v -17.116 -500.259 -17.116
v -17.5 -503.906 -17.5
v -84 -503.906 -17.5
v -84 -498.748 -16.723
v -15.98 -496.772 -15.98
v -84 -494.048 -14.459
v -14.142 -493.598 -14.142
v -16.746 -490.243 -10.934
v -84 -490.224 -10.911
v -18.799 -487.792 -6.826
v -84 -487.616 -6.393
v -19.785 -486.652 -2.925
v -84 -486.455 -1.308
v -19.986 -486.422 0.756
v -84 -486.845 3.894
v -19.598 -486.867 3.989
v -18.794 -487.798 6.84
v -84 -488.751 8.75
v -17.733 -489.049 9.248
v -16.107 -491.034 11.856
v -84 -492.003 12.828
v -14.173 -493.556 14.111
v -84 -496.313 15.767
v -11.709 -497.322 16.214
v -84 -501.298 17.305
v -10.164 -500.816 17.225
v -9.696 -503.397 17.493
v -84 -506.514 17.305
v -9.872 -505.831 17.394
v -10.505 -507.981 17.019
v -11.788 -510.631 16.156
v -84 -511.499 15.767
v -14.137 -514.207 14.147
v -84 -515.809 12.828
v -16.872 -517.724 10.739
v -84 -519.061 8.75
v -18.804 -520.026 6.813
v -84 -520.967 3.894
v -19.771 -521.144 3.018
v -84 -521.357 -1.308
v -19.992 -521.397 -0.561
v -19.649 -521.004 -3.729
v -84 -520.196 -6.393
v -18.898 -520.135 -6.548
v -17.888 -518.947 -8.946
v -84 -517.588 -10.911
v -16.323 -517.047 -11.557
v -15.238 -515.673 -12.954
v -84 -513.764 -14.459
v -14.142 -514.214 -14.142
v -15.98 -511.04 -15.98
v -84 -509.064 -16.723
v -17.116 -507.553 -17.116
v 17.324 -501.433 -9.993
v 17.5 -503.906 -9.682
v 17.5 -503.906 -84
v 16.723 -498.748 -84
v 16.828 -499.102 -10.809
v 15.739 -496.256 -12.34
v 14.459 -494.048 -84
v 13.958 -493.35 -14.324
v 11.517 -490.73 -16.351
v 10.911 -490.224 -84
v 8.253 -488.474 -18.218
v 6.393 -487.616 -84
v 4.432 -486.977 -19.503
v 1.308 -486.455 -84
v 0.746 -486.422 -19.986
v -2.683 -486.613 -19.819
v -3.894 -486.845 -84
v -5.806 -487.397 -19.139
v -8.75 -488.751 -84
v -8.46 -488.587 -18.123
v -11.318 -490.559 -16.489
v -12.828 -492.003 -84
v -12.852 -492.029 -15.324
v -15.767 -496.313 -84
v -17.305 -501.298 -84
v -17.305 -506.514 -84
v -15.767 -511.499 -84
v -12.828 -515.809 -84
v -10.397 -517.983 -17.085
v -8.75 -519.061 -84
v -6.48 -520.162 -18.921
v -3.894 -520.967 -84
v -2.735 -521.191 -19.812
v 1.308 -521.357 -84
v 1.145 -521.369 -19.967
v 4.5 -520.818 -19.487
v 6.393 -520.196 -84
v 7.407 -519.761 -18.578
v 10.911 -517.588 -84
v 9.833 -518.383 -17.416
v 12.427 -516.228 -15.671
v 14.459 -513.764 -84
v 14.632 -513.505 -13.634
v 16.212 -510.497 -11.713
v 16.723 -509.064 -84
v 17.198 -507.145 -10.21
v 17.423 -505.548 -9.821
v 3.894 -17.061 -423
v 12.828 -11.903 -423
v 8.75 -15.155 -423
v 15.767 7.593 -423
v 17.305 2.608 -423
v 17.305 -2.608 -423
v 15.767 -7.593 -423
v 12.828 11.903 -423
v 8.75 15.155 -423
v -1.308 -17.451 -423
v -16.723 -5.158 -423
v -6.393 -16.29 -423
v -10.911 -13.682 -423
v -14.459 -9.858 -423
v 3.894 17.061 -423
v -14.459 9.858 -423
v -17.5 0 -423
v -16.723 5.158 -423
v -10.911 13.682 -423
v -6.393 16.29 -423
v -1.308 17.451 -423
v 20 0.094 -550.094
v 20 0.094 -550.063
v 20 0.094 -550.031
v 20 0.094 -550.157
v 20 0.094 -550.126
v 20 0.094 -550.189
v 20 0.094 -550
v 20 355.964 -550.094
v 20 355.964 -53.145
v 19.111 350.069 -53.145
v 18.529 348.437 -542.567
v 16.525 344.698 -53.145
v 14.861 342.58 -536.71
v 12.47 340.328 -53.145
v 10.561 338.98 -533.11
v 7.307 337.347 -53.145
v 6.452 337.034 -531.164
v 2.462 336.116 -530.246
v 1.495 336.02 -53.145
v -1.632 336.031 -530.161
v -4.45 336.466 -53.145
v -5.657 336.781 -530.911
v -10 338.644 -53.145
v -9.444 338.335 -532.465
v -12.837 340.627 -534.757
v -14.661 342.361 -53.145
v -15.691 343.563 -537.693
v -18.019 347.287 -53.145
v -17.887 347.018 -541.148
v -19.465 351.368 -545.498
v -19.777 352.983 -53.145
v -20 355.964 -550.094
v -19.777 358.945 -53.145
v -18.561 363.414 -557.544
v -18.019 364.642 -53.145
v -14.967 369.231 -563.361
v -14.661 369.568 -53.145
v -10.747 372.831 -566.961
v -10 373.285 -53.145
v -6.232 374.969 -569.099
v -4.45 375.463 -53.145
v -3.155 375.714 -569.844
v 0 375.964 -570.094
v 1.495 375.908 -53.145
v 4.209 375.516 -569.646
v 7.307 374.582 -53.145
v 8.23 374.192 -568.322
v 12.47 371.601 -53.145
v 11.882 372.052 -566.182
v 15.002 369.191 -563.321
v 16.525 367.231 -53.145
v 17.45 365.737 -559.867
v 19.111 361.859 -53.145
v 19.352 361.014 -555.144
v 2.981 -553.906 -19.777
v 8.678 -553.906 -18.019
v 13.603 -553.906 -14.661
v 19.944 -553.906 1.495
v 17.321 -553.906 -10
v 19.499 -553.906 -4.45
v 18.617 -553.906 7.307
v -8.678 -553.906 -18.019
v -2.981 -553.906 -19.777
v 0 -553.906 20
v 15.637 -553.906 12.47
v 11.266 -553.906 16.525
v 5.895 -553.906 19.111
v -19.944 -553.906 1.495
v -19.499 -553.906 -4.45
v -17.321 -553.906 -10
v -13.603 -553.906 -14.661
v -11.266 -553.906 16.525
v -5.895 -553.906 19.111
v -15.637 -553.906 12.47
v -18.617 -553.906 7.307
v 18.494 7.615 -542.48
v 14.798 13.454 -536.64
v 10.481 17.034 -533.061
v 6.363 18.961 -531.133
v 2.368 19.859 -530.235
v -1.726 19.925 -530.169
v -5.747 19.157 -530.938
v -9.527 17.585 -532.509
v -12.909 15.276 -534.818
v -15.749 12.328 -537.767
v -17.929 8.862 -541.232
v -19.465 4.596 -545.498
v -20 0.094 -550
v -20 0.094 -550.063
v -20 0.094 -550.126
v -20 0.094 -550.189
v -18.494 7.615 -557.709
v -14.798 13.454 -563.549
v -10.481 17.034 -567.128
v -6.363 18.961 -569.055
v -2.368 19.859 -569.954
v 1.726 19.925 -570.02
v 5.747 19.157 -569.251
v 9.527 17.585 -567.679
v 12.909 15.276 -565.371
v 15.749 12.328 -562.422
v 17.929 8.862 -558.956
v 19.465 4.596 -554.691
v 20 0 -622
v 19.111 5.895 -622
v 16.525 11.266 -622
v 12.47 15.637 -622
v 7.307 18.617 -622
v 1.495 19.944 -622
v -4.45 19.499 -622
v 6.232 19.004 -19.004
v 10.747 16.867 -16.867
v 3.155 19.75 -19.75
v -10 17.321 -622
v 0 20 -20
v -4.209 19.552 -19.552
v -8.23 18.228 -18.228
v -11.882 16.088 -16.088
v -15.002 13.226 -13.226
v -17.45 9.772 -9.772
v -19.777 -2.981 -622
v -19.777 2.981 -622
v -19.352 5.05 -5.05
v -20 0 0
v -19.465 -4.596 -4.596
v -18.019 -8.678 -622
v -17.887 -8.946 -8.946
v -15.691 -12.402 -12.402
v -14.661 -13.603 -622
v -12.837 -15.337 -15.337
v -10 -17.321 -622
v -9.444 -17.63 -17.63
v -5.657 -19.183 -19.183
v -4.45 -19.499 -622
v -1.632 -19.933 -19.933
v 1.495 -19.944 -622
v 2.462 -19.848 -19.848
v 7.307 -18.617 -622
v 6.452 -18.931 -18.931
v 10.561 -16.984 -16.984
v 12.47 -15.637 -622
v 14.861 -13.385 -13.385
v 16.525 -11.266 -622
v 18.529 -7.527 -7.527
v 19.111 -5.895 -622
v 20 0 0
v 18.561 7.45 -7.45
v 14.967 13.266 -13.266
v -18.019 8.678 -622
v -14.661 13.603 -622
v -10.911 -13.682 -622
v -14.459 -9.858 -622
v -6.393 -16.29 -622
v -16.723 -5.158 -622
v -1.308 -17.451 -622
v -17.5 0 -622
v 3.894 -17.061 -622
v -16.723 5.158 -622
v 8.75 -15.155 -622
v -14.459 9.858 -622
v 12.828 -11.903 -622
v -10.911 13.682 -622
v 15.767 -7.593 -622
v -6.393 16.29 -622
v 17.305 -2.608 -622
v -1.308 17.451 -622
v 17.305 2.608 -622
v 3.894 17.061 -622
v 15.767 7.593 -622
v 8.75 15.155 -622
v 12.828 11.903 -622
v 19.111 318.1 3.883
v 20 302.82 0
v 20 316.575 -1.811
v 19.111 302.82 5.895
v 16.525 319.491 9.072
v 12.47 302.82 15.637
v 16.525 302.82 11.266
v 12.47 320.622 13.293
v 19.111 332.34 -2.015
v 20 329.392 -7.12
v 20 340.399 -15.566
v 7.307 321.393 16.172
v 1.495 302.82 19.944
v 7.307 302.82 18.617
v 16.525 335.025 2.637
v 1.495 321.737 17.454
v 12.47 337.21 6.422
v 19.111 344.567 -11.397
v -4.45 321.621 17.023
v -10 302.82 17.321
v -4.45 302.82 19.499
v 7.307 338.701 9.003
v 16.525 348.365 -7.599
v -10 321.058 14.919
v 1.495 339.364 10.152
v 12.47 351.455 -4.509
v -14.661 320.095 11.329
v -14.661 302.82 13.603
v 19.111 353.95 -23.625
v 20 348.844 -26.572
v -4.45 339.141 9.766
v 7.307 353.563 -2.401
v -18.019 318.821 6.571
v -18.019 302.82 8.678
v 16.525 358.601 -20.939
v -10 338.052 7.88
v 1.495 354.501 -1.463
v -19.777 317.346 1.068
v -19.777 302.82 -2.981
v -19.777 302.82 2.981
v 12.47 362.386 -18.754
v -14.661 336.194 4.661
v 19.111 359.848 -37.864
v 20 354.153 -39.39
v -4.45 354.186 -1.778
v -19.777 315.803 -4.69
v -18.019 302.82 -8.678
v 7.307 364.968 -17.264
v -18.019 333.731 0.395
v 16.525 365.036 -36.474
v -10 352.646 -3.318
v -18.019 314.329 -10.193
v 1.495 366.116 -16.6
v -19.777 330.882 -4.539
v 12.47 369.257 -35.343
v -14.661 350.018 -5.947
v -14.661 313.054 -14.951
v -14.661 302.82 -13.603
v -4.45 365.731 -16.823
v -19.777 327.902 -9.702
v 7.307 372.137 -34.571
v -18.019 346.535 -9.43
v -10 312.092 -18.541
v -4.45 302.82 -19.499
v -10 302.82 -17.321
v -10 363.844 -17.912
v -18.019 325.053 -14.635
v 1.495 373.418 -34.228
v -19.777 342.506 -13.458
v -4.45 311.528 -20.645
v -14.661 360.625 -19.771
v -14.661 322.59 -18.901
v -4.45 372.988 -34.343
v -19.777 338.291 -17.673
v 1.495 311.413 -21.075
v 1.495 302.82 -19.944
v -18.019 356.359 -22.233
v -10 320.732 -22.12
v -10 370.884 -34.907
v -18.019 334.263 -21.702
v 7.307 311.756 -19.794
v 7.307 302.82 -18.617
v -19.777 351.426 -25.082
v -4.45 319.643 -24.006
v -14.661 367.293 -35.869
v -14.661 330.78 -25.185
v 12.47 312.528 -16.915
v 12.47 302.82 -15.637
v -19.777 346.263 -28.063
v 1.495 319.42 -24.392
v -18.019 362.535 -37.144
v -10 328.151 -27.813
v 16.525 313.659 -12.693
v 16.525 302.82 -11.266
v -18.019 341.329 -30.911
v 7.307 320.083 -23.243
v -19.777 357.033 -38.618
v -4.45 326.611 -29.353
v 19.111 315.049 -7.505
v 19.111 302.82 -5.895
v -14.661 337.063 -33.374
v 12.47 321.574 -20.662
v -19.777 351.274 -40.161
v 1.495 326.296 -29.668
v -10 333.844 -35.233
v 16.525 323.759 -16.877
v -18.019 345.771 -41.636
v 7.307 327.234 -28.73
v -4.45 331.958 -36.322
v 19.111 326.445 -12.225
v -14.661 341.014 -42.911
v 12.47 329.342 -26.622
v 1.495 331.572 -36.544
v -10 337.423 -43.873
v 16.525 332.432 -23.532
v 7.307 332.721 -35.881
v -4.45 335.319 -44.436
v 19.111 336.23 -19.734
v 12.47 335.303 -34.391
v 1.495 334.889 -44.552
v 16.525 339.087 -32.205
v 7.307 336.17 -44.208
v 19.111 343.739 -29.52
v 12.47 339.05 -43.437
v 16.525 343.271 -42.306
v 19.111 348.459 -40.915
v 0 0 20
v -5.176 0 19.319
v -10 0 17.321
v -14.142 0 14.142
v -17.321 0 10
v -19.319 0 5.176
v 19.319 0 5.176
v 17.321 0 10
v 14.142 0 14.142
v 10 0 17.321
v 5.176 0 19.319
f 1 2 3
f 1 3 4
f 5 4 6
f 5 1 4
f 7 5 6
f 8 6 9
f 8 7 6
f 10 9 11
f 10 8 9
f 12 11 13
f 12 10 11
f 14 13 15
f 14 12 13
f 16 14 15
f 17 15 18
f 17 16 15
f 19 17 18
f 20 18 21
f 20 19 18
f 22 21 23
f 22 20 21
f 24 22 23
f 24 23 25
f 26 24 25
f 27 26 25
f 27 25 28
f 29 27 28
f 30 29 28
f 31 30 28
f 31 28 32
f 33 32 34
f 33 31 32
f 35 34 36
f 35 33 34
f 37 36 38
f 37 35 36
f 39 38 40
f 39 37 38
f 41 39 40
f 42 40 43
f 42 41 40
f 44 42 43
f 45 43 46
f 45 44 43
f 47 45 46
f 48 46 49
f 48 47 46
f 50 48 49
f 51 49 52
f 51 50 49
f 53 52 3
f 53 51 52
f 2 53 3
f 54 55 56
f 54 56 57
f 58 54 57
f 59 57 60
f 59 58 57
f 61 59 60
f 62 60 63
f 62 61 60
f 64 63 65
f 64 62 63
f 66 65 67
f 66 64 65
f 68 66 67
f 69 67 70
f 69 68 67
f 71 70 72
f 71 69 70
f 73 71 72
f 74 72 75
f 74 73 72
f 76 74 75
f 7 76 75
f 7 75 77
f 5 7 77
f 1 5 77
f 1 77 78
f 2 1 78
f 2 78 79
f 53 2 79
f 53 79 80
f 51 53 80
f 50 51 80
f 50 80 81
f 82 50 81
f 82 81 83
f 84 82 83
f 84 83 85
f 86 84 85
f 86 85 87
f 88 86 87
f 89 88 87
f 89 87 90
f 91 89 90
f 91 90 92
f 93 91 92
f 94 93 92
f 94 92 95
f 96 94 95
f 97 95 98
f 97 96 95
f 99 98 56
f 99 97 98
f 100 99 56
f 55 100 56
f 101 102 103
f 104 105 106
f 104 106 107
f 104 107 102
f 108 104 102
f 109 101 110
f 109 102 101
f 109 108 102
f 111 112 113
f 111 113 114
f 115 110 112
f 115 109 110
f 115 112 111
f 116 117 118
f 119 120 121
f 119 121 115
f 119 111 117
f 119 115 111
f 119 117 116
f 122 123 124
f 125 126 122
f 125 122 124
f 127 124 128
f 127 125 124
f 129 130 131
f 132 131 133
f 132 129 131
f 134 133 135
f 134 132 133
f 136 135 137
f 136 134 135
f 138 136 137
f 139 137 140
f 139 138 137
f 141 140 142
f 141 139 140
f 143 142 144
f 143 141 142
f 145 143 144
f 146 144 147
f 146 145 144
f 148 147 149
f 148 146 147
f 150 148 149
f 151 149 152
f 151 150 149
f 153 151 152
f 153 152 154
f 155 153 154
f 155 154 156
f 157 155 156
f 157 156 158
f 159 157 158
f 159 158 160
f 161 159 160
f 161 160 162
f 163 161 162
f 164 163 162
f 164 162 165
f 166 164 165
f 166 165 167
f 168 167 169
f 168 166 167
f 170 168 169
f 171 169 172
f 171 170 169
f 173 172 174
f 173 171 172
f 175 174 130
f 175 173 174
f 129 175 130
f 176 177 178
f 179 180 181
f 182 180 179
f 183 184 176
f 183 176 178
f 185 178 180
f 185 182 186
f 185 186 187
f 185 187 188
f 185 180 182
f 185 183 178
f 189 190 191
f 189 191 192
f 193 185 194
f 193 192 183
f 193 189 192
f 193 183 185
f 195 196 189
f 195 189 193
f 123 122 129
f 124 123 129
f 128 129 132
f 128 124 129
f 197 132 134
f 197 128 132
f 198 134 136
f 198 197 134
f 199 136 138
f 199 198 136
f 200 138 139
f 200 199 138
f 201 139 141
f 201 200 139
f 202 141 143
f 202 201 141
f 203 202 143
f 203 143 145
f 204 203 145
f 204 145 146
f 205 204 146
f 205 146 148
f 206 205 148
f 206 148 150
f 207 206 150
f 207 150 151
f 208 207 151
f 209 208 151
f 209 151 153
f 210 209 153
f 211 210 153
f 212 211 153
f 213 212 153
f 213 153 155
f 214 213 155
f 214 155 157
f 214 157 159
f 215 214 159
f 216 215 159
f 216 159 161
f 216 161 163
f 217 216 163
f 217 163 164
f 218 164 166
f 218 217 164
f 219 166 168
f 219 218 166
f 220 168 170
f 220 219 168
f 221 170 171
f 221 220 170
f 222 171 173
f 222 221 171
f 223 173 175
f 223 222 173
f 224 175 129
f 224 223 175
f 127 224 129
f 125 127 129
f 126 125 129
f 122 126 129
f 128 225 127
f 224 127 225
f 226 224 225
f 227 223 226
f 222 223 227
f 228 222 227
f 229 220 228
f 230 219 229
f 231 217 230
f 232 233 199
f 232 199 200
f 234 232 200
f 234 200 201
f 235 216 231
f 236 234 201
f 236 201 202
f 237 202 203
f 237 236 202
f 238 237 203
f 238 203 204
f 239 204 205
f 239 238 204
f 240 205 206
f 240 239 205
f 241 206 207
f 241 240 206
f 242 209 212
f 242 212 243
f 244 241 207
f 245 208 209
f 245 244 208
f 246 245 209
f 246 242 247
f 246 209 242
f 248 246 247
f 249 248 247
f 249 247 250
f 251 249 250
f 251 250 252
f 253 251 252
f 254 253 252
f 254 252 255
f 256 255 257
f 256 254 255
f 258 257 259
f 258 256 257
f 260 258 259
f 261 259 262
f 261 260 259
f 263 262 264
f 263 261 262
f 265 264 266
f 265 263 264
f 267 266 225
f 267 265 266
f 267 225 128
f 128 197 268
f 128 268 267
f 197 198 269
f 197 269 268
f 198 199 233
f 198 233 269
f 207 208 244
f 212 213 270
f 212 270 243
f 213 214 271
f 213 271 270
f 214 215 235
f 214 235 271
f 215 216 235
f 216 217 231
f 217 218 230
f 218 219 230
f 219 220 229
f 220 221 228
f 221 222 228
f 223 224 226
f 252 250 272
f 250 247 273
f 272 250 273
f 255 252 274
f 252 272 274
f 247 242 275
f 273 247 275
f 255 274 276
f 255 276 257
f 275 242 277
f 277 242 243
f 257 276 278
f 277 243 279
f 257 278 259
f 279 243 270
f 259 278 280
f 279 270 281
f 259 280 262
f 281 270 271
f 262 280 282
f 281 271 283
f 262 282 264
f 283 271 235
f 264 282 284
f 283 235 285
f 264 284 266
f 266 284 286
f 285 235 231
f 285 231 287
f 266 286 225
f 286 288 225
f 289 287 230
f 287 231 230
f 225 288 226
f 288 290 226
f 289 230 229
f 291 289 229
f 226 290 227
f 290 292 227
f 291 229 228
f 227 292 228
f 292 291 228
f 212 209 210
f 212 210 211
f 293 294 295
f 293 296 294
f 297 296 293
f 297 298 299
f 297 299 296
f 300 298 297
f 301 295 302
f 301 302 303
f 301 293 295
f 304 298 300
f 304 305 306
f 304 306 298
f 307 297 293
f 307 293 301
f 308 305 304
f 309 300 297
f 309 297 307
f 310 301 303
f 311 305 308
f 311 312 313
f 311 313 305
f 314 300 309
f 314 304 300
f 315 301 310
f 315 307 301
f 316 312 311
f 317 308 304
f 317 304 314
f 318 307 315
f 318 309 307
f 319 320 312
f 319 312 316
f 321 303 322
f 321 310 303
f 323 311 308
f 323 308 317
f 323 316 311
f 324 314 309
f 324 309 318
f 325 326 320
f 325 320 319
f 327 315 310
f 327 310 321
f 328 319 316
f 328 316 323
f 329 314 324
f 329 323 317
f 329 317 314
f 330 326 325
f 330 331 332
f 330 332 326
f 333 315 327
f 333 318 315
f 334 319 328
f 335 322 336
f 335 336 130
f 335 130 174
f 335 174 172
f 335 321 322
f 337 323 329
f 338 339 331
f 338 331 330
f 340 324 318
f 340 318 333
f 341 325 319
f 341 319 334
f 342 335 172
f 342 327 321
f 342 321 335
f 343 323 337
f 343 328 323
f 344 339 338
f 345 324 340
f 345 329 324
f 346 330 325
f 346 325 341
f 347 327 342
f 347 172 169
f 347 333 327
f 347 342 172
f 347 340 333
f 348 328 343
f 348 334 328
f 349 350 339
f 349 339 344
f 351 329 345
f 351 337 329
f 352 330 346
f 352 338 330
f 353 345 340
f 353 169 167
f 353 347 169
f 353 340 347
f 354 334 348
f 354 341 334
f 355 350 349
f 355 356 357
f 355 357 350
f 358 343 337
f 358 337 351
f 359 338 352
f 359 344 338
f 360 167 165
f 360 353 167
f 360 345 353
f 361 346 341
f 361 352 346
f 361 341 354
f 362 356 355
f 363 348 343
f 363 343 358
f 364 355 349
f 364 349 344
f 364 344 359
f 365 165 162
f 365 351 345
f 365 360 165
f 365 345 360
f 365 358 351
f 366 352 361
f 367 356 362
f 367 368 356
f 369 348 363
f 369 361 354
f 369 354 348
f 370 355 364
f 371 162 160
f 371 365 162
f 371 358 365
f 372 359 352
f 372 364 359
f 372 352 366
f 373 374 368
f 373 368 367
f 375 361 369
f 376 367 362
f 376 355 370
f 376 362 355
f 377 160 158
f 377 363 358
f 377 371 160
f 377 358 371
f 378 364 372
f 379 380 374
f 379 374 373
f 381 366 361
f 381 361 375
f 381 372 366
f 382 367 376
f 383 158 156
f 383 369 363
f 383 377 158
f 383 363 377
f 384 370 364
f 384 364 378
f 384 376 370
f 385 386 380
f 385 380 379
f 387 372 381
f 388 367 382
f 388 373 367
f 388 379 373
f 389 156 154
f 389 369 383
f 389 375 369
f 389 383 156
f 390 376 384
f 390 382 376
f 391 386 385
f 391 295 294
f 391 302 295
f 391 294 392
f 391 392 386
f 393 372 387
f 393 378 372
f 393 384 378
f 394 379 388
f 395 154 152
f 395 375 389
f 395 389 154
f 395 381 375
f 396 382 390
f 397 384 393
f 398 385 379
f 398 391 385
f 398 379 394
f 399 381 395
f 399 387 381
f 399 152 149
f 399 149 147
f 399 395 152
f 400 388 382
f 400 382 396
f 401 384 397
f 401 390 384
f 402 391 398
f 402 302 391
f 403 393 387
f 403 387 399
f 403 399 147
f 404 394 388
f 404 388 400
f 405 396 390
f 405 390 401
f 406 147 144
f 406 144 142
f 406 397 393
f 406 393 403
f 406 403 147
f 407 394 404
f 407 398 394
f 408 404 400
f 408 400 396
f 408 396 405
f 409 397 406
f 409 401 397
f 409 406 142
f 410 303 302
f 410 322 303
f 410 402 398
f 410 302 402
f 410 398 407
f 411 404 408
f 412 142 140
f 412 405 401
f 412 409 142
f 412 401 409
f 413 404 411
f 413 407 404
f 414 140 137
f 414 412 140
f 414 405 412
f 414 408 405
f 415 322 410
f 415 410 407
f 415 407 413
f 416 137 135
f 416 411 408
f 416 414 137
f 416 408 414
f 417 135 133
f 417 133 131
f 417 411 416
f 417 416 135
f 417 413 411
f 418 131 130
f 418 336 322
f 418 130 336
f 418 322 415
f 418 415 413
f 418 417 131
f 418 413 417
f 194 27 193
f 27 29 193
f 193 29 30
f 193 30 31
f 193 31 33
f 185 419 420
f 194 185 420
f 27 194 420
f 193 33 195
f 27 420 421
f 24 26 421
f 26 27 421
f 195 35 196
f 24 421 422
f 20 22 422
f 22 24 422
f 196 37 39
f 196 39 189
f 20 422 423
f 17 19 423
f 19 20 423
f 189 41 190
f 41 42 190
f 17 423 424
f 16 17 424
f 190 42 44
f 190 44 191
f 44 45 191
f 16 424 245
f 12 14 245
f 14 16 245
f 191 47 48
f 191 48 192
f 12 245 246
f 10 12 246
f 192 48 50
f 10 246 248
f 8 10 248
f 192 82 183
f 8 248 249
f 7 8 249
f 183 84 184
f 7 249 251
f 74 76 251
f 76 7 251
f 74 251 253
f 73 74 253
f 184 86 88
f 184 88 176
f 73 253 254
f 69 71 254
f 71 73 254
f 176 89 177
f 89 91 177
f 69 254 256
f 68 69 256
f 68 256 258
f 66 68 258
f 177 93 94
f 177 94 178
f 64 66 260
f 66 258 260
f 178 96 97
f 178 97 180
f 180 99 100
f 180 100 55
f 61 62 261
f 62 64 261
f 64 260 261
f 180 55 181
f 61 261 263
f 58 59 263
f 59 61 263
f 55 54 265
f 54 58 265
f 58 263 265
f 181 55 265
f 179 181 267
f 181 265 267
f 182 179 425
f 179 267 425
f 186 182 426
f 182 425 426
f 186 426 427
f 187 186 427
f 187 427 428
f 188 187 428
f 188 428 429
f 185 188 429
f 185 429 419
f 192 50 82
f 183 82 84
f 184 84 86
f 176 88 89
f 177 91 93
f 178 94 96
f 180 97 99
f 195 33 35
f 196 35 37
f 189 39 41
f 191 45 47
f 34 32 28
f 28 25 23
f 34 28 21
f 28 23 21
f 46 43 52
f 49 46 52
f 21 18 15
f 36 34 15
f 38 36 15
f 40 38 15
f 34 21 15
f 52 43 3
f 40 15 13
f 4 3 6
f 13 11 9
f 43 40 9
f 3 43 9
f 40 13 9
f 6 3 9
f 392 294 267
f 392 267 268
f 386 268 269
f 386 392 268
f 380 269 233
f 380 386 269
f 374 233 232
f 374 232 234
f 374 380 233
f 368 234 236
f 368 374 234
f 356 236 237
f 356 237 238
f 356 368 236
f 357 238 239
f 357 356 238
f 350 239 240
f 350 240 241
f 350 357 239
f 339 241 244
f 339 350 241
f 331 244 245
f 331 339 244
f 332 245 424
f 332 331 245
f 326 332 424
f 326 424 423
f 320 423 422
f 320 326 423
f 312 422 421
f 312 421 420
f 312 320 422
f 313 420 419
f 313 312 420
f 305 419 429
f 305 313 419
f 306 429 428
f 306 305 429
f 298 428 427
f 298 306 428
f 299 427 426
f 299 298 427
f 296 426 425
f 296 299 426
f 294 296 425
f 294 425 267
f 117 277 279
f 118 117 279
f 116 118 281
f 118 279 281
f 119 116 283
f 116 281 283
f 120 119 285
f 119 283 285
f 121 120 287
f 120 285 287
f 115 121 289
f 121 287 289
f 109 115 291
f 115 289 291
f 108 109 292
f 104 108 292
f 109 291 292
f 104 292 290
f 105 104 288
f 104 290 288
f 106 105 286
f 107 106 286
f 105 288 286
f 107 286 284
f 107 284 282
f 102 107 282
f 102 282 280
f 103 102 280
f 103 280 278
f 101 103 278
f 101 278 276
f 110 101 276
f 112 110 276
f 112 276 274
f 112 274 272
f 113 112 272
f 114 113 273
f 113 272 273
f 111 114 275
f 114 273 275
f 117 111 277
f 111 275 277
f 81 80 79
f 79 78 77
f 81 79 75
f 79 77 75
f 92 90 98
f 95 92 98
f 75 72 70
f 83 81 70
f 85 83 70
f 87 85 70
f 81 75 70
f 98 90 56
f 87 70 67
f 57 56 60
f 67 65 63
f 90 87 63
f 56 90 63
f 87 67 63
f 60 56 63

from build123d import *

# Parameters (mm, degrees)
SKETCH2_R           = 20
SKETCH4_R           = 20
BOSS_EXTRUDE1_DEPTH = 553.90605298
SKETCH5_R           = 20
BOSS_EXTRUDE2_DEPTH = 622
SKETCH6_R           = 17.5
CUT_EXTRUDE1_DEPTH  = 199
SKETCH7_R           = 17.5
BOSS_EXTRUDE3_DEPTH = 84
SKETCH9_R           = 17.5
BOSS_EXTRUDE4_DEPTH = 84


with BuildPart() as part:
    # Sweep1: sweep along a path in Sketch3
    with BuildLine(Plane(origin=(0, 0, 0), x_dir=(0, 0, -1), z_dir=(1, 0, 0))) as sweep1_path:
        Line((0, 0), (0, 302.819820908))
        ThreePointArc((0, 302.819820908), (15.565663847, 340.398657675), (53.144500614, 355.964321522))
        Line((53.144500614, 355.964321522), (550.094321522, 355.964321522))
        Line((550.094321522, 355.964321522), (550.094321522, 0.094321522))
    # Sketch2 → Sweep1 (sweep)
    with BuildSketch(Plane(origin=(0, 0, 0), x_dir=(1, 0, 0), z_dir=(0, 1, 0))):
        Circle(SKETCH2_R)
    sweep(path=sweep1_path.line, transition=Transition.RIGHT)

    # Sketch4 → Boss-Extrude1 (add)
    with BuildSketch(Plane.XZ):
        with Locations(Location((0, 0, 0), (0, 0, 90))):
            Circle(SKETCH4_R)
    extrude(amount=BOSS_EXTRUDE1_DEPTH)

    # Sketch5 → Boss-Extrude2 (add)
    with BuildSketch(Plane.XY):
        Circle(SKETCH5_R)
    extrude(amount=-BOSS_EXTRUDE2_DEPTH)

    # Sketch6 → Cut-Extrude1 (cut)
    with BuildSketch(Plane(origin=(0, 0, -622), x_dir=(-1, 0, 0), z_dir=(0, 0, -1))):
        Circle(SKETCH6_R)
    extrude(amount=-CUT_EXTRUDE1_DEPTH, mode=Mode.SUBTRACT)

    # Sketch7 → Boss-Extrude3 (add)
    with BuildSketch(Plane.XY):
        with Locations((0, -503.90605298)):
            Circle(SKETCH7_R)
    extrude(amount=-BOSS_EXTRUDE3_DEPTH)

    # Sketch9 → Boss-Extrude4 (add)
    with BuildSketch(Plane(origin=(0, 0, 0), x_dir=(0, 0, -1), z_dir=(1, 0, 0))):
        with Locations((0, -503.90605298)):
            Circle(SKETCH9_R)
    extrude(amount=-BOSS_EXTRUDE4_DEPTH)


solid = part.part
